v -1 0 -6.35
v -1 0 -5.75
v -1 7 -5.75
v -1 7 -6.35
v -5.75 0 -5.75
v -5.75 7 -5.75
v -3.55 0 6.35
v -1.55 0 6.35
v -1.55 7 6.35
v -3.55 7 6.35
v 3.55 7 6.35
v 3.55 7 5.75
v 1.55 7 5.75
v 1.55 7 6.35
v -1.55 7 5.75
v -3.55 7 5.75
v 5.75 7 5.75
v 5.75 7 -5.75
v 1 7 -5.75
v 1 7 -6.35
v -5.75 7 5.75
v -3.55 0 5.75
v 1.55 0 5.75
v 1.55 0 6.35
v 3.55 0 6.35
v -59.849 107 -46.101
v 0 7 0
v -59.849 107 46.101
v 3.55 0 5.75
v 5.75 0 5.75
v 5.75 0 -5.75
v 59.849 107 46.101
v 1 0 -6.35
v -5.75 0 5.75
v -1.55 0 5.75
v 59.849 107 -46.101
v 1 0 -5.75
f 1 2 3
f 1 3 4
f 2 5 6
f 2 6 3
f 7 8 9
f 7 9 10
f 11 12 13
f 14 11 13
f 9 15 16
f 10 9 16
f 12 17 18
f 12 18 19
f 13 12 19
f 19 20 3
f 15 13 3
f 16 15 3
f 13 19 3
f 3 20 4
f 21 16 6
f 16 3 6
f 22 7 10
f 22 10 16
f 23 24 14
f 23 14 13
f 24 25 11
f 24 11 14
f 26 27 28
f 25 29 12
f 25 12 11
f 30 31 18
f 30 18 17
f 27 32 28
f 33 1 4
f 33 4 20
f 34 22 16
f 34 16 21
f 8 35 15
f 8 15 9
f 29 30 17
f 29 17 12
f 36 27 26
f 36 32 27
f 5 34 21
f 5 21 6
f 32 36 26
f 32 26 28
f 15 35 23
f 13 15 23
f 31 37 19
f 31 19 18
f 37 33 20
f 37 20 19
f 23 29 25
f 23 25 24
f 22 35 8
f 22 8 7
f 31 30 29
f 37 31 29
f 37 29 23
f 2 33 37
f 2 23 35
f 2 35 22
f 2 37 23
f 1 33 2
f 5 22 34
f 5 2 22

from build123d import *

# Parameters (mm, degrees)
AUFSATZ_LINEAR_AUSTRAGEN1_DEPTH      = 7
AUFSATZ_LINEAR_AUSTRAGEN2_DEPTH      = 100
AUFSATZ_LINEAR_AUSTRAGEN2_DEPTH_BACK = 100
SKIZZE3_OUTSIDE_W                    = 250.97
SKIZZE3_OUTSIDE_H                    = 157.97
SCHNITT_LINEAR_AUSTRAGEN1_DEPTH      = 100
SCHNITT_LINEAR_AUSTRAGEN1_DEPTH_BACK = 100


with BuildPart() as part:
    # Skizze1 → Aufsatz-Linear austragen1 (new body)
    with BuildSketch(Plane(origin=(0, 0, 0), x_dir=(1, 0, 0), z_dir=(0, 1, 0))):
        Polygon((-1, 5.75), (-1, 6.35), (1, 6.35), (1, 5.75), (5.75, 5.75), (5.75, -5.75), (3.55, -5.75), (3.55, -6.35), (1.55, -6.35), (1.55, -5.75), (0, -5.75), (-1.55, -5.75), (-1.55, -6.35), (-3.55, -6.35), (-3.55, -5.75), (-5.75, -5.75), (-5.75, 5.75), align=None)
    extrude(amount=AUFSATZ_LINEAR_AUSTRAGEN1_DEPTH)


with BuildPart() as body_2:
    # Skizze2 → Aufsatz-Linear austragen2 (new body, two sides)
    with BuildSketch(Plane(origin=(0, 0, 0), x_dir=(0, 0, -1), z_dir=(1, 0, 0))) as aufsatz_linear_austragen2_sk:
        Polygon((0, 7), (46.100631443, 107), (-46.100631443, 107), align=None)
    extrude(amount=AUFSATZ_LINEAR_AUSTRAGEN2_DEPTH)
    extrude(aufsatz_linear_austragen2_sk.sketch, amount=-AUFSATZ_LINEAR_AUSTRAGEN2_DEPTH_BACK)

    # Skizze3 outside → Schnitt-Linear austragen1 (cut, two sides)
    with BuildSketch(Plane.XY) as schnitt_linear_austragen1_sk:
        with Locations((0, 53.5)):
            Rectangle(SKIZZE3_OUTSIDE_W, SKIZZE3_OUTSIDE_H)
        Polygon((0, 7), (-59.848765359, 107), (59.848765359, 107), align=None, mode=Mode.SUBTRACT)
    extrude(amount=SCHNITT_LINEAR_AUSTRAGEN1_DEPTH, mode=Mode.SUBTRACT)
    extrude(schnitt_linear_austragen1_sk.sketch, amount=-SCHNITT_LINEAR_AUSTRAGEN1_DEPTH_BACK, mode=Mode.SUBTRACT)


solid = Compound([part.part, body_2.part])
